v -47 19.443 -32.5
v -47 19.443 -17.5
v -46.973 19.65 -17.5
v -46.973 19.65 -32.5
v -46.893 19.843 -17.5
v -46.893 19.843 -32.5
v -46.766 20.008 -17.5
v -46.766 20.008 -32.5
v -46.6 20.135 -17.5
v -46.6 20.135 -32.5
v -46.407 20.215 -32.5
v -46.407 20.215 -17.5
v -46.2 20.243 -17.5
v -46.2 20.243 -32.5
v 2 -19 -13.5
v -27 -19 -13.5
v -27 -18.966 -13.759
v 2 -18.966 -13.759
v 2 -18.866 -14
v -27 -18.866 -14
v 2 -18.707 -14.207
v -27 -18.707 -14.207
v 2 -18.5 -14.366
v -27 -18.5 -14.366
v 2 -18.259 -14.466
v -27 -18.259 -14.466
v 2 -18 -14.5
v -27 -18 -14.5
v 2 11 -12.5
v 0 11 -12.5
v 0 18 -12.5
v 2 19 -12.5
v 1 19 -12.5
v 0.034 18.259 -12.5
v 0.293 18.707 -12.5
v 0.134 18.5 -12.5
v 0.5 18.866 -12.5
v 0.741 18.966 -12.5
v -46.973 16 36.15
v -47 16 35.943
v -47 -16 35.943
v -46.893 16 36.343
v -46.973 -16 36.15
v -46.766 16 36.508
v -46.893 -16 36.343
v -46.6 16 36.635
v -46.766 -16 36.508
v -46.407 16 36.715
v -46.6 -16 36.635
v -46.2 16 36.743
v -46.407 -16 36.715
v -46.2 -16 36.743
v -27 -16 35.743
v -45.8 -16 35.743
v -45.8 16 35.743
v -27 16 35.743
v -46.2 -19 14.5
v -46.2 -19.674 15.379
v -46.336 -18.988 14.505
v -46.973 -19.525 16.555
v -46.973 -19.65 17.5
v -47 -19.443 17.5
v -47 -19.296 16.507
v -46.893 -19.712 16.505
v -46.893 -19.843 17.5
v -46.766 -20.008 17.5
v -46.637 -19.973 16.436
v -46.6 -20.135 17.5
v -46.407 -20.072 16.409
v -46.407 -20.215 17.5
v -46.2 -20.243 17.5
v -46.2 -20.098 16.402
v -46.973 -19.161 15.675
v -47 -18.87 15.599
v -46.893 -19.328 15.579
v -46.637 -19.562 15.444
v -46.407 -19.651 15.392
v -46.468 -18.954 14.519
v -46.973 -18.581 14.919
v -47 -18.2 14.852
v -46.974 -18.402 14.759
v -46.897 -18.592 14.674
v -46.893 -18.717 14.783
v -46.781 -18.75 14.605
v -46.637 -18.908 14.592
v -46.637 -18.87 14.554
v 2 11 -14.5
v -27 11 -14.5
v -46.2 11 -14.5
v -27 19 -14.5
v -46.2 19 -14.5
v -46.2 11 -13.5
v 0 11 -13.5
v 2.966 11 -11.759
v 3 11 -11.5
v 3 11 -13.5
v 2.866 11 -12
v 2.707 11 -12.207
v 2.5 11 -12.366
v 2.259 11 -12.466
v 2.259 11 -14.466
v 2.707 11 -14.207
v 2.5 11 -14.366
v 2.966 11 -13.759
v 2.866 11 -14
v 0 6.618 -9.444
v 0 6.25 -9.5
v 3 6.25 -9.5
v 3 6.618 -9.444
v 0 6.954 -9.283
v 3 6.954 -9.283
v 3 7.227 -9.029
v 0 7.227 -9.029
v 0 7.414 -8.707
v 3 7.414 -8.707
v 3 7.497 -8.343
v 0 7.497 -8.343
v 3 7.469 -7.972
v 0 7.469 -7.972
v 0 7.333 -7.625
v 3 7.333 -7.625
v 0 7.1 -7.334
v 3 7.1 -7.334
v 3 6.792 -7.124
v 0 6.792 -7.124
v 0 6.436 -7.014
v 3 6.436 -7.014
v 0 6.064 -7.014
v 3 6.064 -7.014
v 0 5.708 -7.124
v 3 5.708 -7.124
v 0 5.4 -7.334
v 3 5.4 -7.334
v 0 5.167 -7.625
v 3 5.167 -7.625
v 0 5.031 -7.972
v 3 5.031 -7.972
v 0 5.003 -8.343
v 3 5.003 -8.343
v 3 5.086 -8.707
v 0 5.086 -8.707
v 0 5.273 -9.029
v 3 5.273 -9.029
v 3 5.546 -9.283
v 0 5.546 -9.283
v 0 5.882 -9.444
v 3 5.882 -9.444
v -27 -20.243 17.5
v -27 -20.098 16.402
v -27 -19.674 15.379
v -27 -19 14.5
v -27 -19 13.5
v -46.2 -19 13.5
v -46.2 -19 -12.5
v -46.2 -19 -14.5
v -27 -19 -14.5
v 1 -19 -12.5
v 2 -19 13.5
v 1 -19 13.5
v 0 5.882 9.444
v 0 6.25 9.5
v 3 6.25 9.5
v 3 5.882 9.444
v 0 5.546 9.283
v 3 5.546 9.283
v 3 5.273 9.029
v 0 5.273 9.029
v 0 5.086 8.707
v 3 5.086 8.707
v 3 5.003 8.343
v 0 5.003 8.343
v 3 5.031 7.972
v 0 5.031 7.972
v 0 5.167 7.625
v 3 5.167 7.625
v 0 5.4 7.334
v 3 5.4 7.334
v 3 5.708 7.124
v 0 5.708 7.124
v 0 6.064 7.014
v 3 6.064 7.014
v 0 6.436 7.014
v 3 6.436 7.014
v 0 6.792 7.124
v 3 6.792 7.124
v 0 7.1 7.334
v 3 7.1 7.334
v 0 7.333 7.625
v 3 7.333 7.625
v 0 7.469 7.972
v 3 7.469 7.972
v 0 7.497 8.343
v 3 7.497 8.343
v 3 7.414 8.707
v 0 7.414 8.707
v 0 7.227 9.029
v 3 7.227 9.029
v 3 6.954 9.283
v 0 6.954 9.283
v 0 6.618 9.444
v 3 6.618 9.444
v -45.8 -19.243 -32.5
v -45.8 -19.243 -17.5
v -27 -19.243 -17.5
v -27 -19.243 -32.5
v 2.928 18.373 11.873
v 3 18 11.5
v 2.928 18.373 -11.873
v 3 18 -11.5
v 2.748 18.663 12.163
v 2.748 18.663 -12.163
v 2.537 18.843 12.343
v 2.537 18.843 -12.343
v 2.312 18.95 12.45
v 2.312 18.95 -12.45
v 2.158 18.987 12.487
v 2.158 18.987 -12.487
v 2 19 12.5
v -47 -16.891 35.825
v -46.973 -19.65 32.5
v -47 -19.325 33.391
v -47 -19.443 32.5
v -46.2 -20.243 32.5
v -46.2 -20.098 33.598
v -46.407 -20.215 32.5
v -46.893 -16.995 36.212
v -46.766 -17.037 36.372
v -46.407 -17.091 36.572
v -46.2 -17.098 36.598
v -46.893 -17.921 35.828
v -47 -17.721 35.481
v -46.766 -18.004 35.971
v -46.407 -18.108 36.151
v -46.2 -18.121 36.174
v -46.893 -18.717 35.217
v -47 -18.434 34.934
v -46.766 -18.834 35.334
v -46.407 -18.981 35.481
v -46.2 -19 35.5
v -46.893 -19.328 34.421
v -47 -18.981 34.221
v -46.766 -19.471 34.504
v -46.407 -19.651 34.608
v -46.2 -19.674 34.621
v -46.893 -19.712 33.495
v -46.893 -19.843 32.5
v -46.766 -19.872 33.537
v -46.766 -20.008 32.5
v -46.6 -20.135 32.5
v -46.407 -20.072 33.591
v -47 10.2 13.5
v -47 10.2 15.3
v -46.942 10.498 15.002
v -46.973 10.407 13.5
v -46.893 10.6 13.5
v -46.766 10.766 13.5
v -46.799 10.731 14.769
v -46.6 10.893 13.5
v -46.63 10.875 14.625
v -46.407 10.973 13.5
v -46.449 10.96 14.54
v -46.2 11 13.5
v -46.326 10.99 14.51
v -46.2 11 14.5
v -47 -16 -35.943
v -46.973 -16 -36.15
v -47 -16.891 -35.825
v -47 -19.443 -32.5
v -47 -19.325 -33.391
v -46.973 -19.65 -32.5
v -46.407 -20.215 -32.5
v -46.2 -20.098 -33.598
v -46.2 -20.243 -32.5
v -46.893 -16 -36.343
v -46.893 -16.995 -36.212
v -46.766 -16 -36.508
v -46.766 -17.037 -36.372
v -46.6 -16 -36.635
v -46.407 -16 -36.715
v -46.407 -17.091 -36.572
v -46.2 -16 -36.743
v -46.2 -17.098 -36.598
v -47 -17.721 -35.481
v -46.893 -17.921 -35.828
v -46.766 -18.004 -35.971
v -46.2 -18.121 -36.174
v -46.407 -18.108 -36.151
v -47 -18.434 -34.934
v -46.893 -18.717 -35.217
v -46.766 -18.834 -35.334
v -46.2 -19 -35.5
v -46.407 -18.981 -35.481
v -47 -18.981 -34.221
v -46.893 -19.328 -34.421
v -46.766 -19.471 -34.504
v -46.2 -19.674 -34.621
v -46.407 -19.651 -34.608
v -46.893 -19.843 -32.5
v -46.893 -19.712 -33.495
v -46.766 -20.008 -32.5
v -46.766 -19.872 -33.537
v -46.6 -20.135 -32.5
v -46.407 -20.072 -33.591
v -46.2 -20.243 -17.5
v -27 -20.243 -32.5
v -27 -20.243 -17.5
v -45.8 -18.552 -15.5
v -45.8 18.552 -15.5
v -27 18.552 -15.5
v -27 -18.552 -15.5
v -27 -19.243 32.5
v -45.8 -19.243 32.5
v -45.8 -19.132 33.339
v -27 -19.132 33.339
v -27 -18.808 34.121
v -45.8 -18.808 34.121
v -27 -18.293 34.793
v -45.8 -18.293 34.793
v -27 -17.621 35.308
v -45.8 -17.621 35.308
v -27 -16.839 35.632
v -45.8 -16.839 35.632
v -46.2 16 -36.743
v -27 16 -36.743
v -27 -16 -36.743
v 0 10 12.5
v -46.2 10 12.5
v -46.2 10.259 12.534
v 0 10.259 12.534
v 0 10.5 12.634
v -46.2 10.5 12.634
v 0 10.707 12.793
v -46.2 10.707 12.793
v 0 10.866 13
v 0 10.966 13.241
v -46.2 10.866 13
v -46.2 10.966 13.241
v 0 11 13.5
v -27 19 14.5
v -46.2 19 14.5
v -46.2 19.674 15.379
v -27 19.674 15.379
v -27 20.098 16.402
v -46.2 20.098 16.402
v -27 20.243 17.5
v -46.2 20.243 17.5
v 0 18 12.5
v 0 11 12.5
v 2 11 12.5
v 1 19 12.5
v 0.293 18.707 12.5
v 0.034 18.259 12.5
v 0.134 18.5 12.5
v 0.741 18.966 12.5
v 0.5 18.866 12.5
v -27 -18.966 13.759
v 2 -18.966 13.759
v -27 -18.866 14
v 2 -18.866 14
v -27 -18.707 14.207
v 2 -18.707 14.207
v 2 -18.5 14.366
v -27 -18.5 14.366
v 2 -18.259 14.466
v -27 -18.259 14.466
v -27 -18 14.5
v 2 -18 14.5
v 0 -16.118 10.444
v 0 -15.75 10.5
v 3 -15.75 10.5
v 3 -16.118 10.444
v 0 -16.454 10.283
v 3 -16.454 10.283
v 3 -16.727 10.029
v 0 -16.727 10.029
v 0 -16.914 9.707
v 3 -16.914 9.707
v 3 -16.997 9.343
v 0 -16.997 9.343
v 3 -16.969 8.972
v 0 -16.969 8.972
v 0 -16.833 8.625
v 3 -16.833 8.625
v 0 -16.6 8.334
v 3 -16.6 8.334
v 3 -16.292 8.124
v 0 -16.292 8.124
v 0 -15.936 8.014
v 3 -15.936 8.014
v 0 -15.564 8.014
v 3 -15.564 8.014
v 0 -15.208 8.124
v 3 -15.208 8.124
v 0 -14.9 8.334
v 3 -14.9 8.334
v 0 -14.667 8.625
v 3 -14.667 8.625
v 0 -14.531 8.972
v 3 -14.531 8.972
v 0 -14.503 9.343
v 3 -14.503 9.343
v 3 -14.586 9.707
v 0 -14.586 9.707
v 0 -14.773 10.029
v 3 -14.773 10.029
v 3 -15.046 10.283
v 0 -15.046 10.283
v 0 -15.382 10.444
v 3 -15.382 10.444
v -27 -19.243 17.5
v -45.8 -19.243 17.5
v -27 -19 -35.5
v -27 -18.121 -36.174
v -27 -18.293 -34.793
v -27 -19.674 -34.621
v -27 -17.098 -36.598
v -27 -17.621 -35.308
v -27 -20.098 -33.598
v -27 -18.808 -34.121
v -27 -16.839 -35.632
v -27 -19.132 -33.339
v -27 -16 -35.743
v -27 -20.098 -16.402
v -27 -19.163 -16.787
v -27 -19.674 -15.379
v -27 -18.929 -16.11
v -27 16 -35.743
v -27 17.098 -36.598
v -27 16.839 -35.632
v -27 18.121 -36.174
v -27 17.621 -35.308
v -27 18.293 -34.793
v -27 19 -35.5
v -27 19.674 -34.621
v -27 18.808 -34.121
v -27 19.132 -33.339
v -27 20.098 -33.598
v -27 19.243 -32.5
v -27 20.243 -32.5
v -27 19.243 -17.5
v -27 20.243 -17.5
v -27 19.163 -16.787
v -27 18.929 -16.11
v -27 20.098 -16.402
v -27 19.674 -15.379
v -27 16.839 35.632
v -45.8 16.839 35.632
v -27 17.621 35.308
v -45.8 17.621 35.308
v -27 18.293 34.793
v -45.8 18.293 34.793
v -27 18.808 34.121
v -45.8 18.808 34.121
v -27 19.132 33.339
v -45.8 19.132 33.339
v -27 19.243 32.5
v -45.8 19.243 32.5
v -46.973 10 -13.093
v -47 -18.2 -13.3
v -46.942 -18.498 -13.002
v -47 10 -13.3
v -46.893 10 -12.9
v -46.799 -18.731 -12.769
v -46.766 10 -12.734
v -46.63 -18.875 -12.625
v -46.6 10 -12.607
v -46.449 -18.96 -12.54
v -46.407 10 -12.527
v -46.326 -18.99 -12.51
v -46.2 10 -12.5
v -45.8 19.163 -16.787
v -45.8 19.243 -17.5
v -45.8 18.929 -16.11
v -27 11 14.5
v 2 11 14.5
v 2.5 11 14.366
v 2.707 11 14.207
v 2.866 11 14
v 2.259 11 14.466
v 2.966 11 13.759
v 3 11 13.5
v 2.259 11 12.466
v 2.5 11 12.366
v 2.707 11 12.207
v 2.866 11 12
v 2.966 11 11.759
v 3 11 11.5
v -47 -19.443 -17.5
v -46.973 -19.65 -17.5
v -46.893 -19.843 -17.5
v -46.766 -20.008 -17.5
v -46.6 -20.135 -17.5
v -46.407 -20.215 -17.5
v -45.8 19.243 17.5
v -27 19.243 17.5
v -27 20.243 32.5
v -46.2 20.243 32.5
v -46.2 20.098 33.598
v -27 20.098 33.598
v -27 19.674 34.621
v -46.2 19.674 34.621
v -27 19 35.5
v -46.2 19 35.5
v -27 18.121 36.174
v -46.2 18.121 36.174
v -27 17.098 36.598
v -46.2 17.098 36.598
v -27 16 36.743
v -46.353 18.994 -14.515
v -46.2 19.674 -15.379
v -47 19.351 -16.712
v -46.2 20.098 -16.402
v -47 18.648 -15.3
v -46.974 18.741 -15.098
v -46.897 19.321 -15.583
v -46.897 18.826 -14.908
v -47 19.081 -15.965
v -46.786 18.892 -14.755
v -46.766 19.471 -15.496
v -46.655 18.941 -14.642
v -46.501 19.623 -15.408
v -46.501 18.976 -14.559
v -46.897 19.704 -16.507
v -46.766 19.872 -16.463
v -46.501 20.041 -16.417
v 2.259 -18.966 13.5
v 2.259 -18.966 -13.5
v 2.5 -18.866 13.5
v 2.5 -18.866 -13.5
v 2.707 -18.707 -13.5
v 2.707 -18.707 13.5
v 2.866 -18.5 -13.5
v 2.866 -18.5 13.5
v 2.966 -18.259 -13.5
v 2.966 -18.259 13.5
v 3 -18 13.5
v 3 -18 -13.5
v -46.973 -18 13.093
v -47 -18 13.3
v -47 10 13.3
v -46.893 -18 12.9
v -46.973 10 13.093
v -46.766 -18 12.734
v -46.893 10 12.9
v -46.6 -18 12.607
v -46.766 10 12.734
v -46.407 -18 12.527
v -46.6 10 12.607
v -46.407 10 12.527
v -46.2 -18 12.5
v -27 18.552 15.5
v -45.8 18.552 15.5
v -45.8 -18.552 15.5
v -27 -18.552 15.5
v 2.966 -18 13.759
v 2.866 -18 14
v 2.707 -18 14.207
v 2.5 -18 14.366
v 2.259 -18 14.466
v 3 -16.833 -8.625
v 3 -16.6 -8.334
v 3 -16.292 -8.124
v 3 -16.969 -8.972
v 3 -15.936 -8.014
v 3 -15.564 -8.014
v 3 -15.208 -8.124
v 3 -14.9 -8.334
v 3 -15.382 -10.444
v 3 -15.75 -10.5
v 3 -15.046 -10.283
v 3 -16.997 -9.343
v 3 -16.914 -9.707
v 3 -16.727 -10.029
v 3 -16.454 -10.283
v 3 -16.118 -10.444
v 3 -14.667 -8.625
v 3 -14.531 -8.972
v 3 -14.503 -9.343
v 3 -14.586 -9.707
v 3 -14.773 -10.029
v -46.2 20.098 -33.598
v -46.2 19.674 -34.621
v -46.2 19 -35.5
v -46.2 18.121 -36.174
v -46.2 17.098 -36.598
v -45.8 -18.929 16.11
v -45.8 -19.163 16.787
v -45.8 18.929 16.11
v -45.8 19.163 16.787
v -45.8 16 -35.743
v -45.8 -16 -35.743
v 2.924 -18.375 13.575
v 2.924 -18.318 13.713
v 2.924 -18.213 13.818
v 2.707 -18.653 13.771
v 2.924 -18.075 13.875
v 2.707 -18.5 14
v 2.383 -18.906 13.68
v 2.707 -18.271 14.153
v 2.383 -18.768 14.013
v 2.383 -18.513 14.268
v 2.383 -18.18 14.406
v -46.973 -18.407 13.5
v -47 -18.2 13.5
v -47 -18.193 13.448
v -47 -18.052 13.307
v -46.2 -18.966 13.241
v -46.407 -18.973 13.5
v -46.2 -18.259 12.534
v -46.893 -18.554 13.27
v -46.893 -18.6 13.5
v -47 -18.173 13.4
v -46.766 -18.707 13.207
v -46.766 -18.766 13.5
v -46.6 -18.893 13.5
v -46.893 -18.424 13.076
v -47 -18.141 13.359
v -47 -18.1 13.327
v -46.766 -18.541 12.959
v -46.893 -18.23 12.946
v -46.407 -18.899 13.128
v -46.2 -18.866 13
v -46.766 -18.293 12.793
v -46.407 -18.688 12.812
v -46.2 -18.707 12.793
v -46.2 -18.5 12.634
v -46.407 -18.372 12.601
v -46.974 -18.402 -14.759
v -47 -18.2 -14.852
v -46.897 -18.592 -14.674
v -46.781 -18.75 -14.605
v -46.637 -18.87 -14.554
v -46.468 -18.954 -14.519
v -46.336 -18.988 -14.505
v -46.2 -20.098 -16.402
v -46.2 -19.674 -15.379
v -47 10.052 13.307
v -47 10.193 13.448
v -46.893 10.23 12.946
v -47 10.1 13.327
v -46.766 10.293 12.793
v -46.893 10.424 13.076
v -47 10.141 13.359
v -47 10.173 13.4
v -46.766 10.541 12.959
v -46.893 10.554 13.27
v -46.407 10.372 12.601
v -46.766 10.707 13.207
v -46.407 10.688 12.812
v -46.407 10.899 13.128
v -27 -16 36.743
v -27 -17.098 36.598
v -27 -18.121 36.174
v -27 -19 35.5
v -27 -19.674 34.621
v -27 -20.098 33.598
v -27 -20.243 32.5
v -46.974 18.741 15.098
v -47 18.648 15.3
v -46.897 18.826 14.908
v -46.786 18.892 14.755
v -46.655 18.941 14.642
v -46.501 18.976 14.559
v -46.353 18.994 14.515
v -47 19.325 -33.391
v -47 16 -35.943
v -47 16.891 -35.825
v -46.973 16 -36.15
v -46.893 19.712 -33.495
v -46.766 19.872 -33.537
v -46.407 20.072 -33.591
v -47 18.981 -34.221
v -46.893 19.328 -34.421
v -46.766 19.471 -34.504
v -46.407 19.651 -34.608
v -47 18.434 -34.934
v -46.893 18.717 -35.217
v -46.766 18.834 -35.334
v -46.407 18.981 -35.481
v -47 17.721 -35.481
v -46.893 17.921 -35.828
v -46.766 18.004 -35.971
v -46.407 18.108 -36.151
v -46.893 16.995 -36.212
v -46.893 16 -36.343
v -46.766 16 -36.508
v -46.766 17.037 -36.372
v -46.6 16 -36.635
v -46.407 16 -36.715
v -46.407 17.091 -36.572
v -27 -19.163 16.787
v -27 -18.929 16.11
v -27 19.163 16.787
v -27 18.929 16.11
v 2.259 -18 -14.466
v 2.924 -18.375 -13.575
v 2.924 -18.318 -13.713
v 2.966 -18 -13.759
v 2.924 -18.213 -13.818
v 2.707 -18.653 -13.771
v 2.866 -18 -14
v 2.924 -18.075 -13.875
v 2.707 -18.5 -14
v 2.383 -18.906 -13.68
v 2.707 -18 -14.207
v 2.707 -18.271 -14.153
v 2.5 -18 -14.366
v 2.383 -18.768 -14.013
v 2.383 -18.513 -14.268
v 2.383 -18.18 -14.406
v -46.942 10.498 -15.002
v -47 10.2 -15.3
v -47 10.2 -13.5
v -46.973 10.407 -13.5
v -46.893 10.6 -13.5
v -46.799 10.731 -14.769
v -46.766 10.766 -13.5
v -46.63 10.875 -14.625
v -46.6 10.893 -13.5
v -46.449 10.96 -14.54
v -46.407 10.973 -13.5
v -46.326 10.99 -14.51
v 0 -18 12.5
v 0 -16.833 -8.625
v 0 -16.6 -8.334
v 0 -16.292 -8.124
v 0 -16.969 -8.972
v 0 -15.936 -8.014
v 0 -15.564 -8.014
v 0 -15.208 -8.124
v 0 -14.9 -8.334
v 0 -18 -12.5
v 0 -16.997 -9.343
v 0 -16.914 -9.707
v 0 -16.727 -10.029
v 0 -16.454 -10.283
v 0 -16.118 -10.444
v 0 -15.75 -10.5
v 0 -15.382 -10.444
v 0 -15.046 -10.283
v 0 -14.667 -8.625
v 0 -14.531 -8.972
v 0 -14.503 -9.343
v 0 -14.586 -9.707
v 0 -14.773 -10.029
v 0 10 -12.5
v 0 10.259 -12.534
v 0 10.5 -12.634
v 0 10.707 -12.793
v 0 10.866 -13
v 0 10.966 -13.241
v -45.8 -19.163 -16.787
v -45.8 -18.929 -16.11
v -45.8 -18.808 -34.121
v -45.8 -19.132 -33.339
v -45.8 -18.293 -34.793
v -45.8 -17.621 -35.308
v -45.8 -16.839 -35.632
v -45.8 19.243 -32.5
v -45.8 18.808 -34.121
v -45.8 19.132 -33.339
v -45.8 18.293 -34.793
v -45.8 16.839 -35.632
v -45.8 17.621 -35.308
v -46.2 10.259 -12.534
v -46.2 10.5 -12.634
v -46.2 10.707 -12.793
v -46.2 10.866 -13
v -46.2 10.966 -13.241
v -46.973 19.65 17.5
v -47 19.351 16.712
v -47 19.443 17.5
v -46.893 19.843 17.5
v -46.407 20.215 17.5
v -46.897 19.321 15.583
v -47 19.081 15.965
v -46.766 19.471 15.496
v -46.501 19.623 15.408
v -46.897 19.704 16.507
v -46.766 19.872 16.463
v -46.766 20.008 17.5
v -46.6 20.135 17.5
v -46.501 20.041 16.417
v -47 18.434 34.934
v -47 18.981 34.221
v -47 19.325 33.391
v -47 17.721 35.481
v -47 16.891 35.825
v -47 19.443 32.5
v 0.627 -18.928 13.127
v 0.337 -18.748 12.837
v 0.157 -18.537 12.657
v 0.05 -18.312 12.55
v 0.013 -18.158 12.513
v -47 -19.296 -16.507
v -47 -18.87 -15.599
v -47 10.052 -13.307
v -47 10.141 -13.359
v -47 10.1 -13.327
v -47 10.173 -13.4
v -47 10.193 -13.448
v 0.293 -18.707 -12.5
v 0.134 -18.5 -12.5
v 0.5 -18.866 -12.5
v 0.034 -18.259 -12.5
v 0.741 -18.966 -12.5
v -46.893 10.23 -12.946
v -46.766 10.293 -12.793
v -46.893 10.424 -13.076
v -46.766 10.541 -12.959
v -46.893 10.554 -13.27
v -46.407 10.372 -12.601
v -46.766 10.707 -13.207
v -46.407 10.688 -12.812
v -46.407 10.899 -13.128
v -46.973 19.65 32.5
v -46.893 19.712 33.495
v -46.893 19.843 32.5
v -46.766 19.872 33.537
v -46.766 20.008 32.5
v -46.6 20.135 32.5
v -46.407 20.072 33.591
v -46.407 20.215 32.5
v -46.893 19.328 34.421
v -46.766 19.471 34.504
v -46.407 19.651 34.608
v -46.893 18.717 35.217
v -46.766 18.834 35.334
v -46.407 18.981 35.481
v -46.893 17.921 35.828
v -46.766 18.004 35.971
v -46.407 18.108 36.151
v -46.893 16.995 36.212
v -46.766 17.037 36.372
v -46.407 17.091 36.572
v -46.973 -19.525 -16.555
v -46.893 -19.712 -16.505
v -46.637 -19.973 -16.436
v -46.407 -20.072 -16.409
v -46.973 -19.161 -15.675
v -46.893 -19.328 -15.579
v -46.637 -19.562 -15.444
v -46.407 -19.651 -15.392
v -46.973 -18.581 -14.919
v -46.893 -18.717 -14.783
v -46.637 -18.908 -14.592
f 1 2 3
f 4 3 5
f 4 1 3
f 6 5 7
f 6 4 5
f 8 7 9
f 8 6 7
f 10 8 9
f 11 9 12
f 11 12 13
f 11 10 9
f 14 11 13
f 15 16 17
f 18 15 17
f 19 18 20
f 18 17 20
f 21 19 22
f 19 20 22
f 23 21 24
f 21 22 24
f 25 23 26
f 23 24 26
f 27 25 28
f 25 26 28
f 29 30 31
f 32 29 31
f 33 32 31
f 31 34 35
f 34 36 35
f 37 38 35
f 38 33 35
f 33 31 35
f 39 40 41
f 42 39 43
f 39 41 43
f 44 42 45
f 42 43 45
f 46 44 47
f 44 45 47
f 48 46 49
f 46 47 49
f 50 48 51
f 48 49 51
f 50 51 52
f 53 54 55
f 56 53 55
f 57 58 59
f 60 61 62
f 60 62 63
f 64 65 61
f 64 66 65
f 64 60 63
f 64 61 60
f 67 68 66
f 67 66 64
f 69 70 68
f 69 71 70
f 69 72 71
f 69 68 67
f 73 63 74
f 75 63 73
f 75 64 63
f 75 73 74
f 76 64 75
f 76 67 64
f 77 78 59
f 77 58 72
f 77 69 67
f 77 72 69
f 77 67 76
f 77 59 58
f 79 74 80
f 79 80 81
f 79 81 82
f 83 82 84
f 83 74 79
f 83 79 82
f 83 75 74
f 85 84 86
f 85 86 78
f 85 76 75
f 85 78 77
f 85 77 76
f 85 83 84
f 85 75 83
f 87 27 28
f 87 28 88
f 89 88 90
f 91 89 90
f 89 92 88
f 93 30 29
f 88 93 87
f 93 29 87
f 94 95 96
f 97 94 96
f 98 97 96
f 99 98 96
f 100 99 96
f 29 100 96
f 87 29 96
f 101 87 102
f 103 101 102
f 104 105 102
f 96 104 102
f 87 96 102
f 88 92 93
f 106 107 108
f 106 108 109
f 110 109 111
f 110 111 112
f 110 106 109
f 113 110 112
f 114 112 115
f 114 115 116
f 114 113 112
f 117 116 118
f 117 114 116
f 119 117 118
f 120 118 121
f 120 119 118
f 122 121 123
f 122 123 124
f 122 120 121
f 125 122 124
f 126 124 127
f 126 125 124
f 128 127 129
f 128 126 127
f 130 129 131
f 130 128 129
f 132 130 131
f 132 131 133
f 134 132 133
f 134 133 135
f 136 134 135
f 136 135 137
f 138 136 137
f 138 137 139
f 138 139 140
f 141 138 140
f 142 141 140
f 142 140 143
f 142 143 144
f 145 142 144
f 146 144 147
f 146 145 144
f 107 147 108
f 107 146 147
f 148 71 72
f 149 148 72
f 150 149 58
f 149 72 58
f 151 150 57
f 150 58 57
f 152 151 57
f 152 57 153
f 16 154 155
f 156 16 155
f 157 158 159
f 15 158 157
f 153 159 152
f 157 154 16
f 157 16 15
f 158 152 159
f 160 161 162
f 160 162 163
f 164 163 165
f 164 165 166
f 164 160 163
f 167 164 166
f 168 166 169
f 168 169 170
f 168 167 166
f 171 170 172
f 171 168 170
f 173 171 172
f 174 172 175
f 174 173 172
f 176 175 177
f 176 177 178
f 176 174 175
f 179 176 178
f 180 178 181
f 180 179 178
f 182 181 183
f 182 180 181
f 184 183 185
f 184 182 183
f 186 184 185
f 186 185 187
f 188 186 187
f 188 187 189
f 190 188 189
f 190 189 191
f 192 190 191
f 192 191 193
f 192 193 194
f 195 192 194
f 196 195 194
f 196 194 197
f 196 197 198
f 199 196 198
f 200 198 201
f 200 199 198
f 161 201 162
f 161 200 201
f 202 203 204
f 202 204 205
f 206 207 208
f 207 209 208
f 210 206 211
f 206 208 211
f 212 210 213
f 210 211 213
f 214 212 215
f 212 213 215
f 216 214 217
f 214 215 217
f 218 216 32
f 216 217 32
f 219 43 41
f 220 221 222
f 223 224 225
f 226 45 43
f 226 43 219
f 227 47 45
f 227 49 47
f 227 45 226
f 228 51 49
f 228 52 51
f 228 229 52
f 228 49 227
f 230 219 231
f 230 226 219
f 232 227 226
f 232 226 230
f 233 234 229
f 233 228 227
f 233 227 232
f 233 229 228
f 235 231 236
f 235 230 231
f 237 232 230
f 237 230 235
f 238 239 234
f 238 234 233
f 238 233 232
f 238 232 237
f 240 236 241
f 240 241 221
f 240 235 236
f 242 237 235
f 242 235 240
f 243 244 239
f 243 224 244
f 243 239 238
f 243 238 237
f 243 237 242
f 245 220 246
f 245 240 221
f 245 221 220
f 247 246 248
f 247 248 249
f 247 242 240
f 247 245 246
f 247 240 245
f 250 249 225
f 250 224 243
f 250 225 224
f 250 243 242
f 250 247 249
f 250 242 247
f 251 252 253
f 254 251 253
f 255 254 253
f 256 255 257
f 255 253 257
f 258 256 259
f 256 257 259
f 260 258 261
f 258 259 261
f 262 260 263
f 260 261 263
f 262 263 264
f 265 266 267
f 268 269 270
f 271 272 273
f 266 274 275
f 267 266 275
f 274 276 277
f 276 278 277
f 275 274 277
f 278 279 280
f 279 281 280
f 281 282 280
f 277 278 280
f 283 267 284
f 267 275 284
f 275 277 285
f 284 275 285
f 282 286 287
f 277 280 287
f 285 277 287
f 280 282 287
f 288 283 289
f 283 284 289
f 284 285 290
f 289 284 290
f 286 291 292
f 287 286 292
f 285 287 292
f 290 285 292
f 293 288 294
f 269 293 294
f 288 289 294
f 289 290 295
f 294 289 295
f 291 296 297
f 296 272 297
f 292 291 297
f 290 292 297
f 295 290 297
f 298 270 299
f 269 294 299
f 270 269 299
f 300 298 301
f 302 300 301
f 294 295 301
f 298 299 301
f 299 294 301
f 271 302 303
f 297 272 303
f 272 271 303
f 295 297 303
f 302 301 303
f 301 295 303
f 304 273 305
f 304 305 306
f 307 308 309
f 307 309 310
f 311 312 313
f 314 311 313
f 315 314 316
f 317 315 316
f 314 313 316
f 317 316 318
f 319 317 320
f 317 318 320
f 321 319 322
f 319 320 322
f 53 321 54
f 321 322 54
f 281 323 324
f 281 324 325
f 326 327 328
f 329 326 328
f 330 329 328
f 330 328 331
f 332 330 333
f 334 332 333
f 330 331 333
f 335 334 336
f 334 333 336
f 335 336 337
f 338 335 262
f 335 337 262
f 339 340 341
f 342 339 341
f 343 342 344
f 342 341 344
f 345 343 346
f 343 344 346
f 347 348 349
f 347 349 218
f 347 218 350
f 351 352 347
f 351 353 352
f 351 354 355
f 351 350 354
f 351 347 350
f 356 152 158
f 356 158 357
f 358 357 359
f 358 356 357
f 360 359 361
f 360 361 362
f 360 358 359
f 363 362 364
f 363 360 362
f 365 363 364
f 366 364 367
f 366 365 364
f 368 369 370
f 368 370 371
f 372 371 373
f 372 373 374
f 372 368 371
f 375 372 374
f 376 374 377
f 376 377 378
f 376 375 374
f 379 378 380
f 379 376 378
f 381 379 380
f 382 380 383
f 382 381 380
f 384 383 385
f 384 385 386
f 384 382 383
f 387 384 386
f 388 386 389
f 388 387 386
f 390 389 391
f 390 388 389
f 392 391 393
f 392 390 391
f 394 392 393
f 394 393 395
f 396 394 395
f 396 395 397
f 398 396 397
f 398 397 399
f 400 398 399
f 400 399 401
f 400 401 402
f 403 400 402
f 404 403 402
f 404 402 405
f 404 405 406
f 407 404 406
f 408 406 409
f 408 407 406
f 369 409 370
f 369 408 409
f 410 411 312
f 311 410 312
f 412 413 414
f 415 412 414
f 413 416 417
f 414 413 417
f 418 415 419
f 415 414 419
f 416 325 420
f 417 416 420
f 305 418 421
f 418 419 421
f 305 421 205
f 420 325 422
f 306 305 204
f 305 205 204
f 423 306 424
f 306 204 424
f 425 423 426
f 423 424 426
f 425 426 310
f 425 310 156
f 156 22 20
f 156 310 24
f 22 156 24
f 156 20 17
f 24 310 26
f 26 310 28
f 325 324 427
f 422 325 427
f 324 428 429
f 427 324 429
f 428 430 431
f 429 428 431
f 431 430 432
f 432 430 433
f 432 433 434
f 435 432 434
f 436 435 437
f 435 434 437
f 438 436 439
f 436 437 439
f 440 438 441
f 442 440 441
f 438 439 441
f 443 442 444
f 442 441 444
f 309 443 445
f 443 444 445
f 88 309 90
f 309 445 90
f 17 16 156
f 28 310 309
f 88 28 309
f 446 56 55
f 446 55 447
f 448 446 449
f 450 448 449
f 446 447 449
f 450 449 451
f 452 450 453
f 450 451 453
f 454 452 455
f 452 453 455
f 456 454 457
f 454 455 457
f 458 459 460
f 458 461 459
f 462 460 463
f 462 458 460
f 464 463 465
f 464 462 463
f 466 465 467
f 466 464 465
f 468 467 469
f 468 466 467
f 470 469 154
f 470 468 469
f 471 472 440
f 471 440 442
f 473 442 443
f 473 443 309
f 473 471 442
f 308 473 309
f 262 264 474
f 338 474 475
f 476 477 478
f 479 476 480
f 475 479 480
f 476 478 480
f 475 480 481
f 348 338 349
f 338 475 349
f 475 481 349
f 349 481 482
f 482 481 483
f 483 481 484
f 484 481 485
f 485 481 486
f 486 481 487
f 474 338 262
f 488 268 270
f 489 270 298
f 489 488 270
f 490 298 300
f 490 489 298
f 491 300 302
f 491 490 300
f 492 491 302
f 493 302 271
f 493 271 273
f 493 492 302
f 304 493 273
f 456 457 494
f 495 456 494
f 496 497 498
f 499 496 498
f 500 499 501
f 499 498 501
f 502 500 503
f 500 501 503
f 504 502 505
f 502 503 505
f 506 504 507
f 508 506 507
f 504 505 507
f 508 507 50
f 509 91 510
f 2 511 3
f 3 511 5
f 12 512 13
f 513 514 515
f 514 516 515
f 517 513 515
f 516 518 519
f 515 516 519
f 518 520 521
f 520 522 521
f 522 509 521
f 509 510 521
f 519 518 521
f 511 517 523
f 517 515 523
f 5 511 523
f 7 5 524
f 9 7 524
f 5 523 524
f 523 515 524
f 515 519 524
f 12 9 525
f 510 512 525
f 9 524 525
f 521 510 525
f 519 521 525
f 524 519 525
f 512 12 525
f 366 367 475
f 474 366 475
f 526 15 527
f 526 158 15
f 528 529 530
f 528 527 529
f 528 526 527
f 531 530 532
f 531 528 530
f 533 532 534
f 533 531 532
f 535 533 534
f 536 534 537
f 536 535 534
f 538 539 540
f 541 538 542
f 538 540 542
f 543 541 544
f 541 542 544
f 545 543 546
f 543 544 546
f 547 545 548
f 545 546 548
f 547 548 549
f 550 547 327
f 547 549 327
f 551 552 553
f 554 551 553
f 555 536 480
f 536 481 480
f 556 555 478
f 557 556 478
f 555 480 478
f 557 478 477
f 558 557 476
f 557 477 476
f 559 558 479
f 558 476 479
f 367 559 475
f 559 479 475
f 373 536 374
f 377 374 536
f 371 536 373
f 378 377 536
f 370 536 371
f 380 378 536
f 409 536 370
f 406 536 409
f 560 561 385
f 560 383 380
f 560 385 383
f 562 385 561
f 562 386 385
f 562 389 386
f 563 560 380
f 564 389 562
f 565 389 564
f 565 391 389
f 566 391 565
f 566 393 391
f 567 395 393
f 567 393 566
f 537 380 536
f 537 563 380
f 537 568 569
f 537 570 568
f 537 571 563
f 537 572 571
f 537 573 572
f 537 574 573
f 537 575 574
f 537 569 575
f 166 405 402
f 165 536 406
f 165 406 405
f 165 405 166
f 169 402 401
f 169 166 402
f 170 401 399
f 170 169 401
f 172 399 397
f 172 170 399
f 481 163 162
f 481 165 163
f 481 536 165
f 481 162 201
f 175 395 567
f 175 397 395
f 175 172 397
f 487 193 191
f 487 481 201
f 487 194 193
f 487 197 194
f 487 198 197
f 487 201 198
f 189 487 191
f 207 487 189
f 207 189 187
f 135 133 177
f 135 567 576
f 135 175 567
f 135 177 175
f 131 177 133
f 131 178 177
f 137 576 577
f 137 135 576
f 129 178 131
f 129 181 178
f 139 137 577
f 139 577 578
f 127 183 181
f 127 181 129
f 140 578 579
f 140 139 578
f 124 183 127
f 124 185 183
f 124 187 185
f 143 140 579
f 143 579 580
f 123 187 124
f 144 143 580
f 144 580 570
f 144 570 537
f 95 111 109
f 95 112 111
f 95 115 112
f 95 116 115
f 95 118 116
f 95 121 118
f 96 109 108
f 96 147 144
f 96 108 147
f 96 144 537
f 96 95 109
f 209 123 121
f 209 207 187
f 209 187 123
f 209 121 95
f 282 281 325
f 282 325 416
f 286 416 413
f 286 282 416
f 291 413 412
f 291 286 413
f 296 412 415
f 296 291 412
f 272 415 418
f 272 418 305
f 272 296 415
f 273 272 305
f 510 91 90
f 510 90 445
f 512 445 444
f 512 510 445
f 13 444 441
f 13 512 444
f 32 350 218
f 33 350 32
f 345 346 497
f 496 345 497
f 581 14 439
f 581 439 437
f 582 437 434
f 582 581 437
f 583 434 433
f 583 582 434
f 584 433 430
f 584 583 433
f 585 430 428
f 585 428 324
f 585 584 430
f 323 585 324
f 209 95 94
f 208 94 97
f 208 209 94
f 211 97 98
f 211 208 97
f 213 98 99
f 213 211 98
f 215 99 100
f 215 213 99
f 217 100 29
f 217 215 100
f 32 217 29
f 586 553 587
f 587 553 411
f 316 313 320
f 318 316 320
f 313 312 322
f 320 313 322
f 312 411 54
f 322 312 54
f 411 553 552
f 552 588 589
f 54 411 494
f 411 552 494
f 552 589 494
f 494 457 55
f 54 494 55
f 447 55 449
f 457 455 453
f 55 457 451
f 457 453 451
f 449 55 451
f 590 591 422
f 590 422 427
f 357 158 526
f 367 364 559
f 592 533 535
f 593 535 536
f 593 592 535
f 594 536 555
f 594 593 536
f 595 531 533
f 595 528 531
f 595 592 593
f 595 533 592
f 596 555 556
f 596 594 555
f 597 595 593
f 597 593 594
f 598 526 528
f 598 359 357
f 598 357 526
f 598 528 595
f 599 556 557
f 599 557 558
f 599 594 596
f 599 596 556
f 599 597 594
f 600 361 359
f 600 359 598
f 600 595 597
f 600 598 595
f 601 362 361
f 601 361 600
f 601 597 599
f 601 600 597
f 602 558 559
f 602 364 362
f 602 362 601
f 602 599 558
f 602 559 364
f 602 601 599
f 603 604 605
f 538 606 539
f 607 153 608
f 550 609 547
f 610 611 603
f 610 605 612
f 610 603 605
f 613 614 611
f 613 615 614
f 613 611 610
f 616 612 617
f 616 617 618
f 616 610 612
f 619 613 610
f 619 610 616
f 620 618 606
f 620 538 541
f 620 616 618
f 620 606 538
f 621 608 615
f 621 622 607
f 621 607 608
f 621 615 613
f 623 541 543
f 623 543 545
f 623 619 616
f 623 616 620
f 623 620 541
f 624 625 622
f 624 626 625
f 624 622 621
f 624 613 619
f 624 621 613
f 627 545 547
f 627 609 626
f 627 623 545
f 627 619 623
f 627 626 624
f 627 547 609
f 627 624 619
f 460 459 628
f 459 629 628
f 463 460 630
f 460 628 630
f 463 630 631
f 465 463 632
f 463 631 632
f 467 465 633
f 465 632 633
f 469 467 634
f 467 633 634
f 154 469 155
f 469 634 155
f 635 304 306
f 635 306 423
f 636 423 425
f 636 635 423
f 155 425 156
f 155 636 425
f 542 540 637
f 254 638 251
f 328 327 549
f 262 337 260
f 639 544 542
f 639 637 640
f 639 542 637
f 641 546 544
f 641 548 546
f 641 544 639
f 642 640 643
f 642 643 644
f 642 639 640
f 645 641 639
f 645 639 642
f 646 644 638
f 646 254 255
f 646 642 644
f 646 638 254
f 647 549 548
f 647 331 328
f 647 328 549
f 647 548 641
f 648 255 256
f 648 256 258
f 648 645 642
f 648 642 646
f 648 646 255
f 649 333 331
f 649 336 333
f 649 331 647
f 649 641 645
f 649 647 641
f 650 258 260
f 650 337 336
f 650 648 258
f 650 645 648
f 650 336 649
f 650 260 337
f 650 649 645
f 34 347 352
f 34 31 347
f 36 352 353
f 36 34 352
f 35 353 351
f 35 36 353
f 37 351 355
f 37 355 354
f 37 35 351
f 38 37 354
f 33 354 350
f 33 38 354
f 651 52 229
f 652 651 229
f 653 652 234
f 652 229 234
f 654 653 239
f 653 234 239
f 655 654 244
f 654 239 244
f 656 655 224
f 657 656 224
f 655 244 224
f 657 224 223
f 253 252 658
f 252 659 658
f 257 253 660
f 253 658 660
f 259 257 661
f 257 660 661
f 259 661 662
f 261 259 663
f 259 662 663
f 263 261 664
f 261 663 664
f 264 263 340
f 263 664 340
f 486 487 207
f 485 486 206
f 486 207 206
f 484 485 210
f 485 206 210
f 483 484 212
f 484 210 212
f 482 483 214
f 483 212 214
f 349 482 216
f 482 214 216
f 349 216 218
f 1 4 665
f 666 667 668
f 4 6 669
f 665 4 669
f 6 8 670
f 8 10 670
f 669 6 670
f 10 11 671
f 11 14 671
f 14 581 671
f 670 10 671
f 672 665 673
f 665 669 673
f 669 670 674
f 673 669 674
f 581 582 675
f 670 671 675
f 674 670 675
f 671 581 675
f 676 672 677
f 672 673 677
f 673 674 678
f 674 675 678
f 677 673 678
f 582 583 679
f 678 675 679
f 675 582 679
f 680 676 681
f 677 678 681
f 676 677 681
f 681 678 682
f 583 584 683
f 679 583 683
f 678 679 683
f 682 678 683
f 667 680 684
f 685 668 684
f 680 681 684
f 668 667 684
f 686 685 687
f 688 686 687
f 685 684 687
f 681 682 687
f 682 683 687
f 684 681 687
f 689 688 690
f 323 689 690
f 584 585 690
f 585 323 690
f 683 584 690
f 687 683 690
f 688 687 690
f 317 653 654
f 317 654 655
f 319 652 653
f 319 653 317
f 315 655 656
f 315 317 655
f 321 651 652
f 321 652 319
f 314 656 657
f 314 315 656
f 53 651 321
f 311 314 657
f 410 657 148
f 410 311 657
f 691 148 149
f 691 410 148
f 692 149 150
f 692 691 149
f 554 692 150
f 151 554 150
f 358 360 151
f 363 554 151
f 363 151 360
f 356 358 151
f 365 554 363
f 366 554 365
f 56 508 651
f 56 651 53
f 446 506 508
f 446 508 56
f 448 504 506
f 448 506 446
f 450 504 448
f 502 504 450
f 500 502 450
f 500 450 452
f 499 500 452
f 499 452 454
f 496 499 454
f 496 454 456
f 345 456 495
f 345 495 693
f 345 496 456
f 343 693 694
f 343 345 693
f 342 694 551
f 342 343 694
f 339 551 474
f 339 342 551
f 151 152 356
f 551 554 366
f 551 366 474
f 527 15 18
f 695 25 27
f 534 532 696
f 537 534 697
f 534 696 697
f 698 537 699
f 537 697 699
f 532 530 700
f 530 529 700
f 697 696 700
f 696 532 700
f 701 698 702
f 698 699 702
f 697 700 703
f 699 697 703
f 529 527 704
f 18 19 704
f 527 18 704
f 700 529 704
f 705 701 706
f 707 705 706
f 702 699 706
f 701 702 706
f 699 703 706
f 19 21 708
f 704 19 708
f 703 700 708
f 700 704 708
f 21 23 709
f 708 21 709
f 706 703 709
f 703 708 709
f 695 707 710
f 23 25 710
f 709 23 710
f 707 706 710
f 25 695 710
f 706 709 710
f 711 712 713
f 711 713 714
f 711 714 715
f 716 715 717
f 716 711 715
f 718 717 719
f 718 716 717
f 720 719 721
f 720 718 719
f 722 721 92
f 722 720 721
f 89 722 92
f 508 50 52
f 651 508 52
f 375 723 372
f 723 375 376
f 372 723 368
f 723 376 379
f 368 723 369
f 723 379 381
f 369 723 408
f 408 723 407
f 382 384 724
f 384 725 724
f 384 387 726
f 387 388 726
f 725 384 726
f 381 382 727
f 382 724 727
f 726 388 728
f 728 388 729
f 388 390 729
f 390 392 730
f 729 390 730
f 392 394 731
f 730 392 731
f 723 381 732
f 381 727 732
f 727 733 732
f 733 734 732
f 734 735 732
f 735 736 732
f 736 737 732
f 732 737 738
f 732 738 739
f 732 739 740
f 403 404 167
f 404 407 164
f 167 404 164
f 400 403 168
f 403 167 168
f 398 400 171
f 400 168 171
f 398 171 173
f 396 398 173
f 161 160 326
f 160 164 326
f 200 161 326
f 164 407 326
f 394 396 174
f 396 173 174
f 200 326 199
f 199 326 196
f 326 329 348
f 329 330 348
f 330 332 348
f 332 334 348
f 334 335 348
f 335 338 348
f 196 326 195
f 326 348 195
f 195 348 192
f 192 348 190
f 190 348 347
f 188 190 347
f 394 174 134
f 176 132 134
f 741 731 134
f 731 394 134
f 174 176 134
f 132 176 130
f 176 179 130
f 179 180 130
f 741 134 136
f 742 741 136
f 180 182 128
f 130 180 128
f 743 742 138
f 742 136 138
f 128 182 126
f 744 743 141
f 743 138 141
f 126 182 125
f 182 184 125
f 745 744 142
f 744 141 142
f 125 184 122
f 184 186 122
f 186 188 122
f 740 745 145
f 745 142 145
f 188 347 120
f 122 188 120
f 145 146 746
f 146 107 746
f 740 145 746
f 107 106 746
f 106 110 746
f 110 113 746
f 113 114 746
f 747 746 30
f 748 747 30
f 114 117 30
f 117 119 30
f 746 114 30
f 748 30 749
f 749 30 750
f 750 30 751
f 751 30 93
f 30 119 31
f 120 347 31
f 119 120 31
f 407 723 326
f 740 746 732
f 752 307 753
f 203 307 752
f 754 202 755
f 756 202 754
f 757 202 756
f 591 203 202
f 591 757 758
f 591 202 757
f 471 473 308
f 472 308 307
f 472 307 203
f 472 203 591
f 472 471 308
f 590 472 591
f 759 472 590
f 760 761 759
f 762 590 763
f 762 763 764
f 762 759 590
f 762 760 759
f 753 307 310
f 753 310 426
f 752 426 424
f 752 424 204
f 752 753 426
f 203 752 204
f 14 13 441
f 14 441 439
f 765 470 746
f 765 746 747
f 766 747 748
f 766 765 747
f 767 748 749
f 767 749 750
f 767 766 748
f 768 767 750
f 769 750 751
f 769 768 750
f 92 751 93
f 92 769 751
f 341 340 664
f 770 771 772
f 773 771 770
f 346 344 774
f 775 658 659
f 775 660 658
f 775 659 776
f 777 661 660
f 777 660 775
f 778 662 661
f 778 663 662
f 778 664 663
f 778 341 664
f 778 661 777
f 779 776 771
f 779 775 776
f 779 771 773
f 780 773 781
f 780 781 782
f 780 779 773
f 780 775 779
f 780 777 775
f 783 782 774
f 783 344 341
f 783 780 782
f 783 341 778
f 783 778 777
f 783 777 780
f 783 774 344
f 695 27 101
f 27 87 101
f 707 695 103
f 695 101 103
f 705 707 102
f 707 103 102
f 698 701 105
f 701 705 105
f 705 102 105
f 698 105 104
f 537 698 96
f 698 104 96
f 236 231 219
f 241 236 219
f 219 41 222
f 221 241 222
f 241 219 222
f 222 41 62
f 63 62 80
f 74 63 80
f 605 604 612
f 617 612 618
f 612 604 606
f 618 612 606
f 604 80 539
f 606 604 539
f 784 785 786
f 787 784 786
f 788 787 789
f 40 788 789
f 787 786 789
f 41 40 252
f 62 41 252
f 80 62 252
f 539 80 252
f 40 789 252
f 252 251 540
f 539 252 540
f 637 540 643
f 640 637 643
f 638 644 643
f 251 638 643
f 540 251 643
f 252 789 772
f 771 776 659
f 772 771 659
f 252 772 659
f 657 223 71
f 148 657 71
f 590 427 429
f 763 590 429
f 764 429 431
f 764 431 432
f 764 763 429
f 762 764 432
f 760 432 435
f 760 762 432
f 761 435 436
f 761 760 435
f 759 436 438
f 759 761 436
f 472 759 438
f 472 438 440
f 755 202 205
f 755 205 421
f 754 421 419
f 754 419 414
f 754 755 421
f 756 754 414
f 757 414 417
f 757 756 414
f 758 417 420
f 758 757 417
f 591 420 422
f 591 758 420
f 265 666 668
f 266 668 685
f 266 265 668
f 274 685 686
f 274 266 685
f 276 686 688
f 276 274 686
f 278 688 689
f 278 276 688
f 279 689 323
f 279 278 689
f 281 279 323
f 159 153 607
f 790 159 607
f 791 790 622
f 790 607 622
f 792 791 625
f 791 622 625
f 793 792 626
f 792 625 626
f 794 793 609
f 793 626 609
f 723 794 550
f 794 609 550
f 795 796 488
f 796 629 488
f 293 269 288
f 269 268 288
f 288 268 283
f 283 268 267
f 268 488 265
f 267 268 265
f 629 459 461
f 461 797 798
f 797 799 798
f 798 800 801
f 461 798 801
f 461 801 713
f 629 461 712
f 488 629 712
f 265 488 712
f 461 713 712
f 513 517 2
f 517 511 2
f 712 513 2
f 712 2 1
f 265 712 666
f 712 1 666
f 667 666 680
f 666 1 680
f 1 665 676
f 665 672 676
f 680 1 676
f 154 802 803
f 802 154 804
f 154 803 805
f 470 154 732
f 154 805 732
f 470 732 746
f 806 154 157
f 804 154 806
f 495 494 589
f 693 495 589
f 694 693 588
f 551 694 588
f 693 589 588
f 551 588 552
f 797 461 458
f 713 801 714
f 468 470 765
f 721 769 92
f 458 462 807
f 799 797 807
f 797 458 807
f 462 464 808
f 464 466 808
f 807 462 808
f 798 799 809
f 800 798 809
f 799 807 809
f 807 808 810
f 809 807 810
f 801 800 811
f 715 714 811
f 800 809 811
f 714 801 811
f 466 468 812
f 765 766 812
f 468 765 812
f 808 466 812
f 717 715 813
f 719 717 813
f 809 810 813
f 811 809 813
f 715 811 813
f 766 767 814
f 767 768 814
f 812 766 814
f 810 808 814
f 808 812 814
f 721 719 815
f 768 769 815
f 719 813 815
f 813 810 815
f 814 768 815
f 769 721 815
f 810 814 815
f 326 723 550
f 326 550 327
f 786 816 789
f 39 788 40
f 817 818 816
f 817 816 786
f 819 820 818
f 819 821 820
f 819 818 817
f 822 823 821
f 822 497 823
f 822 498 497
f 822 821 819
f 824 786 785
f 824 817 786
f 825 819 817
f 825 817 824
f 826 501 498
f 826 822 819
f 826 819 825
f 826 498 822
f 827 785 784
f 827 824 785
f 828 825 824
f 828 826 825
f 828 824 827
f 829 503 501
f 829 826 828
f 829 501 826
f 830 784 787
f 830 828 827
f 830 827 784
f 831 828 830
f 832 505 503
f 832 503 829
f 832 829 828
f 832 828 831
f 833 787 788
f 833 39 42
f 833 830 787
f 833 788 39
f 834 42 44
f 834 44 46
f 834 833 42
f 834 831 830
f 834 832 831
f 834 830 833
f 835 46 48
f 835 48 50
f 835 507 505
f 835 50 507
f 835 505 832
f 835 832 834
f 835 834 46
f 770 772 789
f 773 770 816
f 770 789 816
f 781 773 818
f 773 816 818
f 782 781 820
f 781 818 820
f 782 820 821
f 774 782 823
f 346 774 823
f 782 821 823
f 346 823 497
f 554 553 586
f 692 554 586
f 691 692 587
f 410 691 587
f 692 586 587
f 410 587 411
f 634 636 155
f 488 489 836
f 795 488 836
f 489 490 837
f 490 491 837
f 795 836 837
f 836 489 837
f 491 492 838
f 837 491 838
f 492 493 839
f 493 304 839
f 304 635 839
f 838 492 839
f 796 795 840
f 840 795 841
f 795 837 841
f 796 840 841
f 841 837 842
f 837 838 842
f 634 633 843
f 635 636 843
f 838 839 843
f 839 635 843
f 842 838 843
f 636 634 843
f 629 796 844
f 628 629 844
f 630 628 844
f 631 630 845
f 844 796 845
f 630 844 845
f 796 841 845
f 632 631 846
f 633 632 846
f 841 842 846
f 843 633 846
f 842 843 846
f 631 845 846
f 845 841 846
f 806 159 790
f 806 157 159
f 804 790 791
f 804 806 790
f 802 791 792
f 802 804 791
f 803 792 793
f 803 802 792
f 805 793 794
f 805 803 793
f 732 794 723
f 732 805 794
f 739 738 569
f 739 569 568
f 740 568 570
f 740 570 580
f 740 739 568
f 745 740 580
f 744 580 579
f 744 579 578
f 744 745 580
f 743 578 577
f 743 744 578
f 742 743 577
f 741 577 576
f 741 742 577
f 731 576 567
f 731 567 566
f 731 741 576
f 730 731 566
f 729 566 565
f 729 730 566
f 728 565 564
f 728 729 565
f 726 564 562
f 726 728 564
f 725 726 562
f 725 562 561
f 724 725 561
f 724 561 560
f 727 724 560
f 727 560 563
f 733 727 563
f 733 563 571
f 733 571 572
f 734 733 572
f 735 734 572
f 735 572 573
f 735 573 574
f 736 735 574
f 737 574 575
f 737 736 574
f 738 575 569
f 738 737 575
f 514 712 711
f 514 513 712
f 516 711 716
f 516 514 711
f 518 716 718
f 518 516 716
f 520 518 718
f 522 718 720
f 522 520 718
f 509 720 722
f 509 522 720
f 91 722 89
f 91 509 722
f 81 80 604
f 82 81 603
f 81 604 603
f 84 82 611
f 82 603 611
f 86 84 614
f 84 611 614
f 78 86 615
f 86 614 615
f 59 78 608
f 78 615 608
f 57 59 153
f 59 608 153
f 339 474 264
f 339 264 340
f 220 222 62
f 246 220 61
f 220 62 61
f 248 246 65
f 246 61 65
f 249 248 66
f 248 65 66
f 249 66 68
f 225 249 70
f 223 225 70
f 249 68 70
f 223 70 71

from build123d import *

# Parameters (mm, degrees)
SKETCH_1_W      = 25
SKETCH_1_H      = 38
SKETCH_1_R      = 1.25
EXTRUDE_2_DEPTH = 3
SKETCH_2_W      = 2
SKETCH_2_H      = 30
EXTRUDE_3_DEPTH = 50
EXTRUDE_6_DEPTH = 20
EXTRUDE_7_DEPTH = 1.2
FILLET_4_R      = 1
FILLET_5_R      = 0.8


with BuildPart() as part:
    # 草图1 → 凸台-拉伸2 (new body)
    with BuildSketch(Plane(origin=(0, 0, 0), x_dir=(0, 0, -1), z_dir=(1, 0, 0))):
        Rectangle(SKETCH_1_W, SKETCH_1_H)
        with Locations((9.25, -15.75)):
            Circle(SKETCH_1_R, mode=Mode.SUBTRACT)
        with Locations((8.25, 6.25)):
            Circle(SKETCH_1_R, mode=Mode.SUBTRACT)
        with Locations(Location((-9.25, -15.75, 0), (0, 0, 180))):
            Circle(SKETCH_1_R, mode=Mode.SUBTRACT)
        with Locations(Location((-8.25, 6.25, 0), (0, 0, 180))):
            Circle(SKETCH_1_R, mode=Mode.SUBTRACT)
    extrude(amount=EXTRUDE_2_DEPTH)

    # 草图2 → 凸台-拉伸3 (add)
    with BuildSketch(Plane(origin=(3, 0, 0), x_dir=(0, 0, -1), z_dir=(1, 0, 0))):
        with Locations((13.5, -4)):
            Rectangle(SKETCH_2_W, SKETCH_2_H)
        with Locations((-13.5, -4)):
            Rectangle(SKETCH_2_W, SKETCH_2_H)
    extrude(amount=-EXTRUDE_3_DEPTH)

    # 草图4 → 凸台-拉伸6 (add)
    # profile 1 of 2: a face of its own
    with BuildSketch(Plane.ZY.offset(47)):
        with BuildLine():
            Line((-14.5, 11), (-14.5, 19))
            ThreePointArc((-14.5, 19), (-15.8764117, 19.919688895), (-17.5, 20.242640687))
            Line((-17.5, 20.242640687), (-32.5, 20.242640687))
            ThreePointArc((-32.5, 20.242640687), (-35.5, 19), (-36.742640687, 16))
            Line((-36.742640687, 16), (-36.742640687, -16))
            ThreePointArc((-36.742640687, -16), (-35.5, -19), (-32.5, -20.242640687))
            Line((-32.5, -20.242640687), (-17.5, -20.242640687))
            ThreePointArc((-17.5, -20.242640687), (-15.8764117, -19.919688895), (-14.5, -19))
            Line((-14.5, -19), (-14.5, 11))
        make_face()
        with BuildLine():
            Line((-32.5, 19.242640687), (-25, 19.242640687))
            Line((-25, 19.242640687), (-17.5, 19.242640687))
            ThreePointArc((-17.5, 19.242640687), (-16.442120098, 19.065225724), (-15.5, 18.552394685))
            Line((-15.5, 18.552394685), (-15.5, -12.035462258))
            Line((-15.5, -12.035462258), (-15.5, -18.552394685))
            ThreePointArc((-15.5, -18.552394685), (-16.442120098, -19.065225724), (-17.5, -19.242640687))
            Line((-17.5, -19.242640687), (-31.503062925, -19.242640687))
            Line((-31.503062925, -19.242640687), (-32.5, -19.242640687))
            ThreePointArc((-32.5, -19.242640687), (-34.792893219, -18.292893219), (-35.742640687, -16))
            Line((-35.742640687, -16), (-35.742640687, -12.035462258))
            Line((-35.742640687, -12.035462258), (-35.742640687, 16))
            ThreePointArc((-35.742640687, 16), (-34.792893219, 18.292893219), (-32.5, 19.242640687))
        make_face(mode=Mode.SUBTRACT)
    # profile 2 of 2: a face of its own
    with BuildSketch(Plane.ZY.offset(47)):
        with BuildLine():
            Line((14.5, -19), (14.5, 11))
            Line((14.5, 11), (14.5, 19))
            ThreePointArc((14.5, 19), (15.8764117, 19.919688895), (17.5, 20.242640687))
            Line((17.5, 20.242640687), (32.5, 20.242640687))
            ThreePointArc((32.5, 20.242640687), (35.5, 19), (36.742640687, 16))
            Line((36.742640687, 16), (36.742640687, -16))
            ThreePointArc((36.742640687, -16), (35.5, -19), (32.5, -20.242640687))
            Line((32.5, -20.242640687), (17.5, -20.242640687))
            ThreePointArc((17.5, -20.242640687), (15.8764117, -19.919688895), (14.5, -19))
        make_face()
        with BuildLine():
            Line((35.742640687, -12.035462258), (35.742640687, 16))
            ThreePointArc((35.742640687, 16), (34.792893219, 18.292893219), (32.5, 19.242640687))
            Line((32.5, 19.242640687), (25, 19.242640687))
            Line((25, 19.242640687), (17.5, 19.242640687))
            ThreePointArc((17.5, 19.242640687), (16.442120098, 19.065225724), (15.5, 18.552394685))
            Line((15.5, 18.552394685), (15.5, -12.035462258))
            Line((15.5, -12.035462258), (15.5, -18.552394685))
            ThreePointArc((15.5, -18.552394685), (16.442120098, -19.065225724), (17.5, -19.242640687))
            Line((17.5, -19.242640687), (31.503062925, -19.242640687))
            Line((31.503062925, -19.242640687), (32.5, -19.242640687))
            ThreePointArc((32.5, -19.242640687), (34.792893219, -18.292893219), (35.742640687, -16))
            Line((35.742640687, -16), (35.742640687, -12.035462258))
        make_face(mode=Mode.SUBTRACT)
    extrude(amount=-EXTRUDE_6_DEPTH)

    # 草图5 → 凸台-拉伸7 (add)
    with BuildSketch(Plane.ZY.offset(47)):
        with BuildLine():
            Line((-32.5, 19.242640687), (-17.5, 19.242640687))
            ThreePointArc((-17.5, 19.242640687), (-16.442120098, 19.065225724), (-15.5, 18.552394685))
            Line((-15.5, 18.552394685), (-15.5, -18.552394685))
            ThreePointArc((-15.5, -18.552394685), (-16.442120098, -19.065225724), (-17.5, -19.242640687))
            Line((-17.5, -19.242640687), (-32.5, -19.242640687))
            ThreePointArc((-32.5, -19.242640687), (-34.792893219, -18.292893219), (-35.742640687, -16))
            Line((-35.742640687, -16), (-35.742640687, 16))
            ThreePointArc((-35.742640687, 16), (-34.792893219, 18.292893219), (-32.5, 19.242640687))
        make_face()
        with BuildLine():
            Line((35.742640687, -16), (35.742640687, 16))
            ThreePointArc((35.742640687, 16), (34.792893219, 18.292893219), (32.5, 19.242640687))
            Line((32.5, 19.242640687), (17.5, 19.242640687))
            ThreePointArc((17.5, 19.242640687), (16.442120098, 19.065225724), (15.5, 18.552394685))
            Line((15.5, 18.552394685), (15.5, -18.552394685))
            ThreePointArc((15.5, -18.552394685), (16.442120098, -19.065225724), (17.5, -19.242640687))
            Line((17.5, -19.242640687), (32.5, -19.242640687))
            ThreePointArc((32.5, -19.242640687), (34.792893219, -18.292893219), (35.742640687, -16))
        make_face()
    extrude(amount=-EXTRUDE_7_DEPTH)

    # 圆角4
    fillet_4_edges = [part.edges().sort_by_distance(p)[0] for p in [
        (-23.5, -19, 12.5),
        (-12, -19, 14.5),
        (-12, -19, -14.5),
        (0, -19, 0),
        (0, 19, 0),
        (-23.5, 11, -12.5),
        (-23.5, 11, 12.5),
        (3, -19, 0),
        (3, 15, 12.5),
        (3, -4, 14.5),
        (3, -4, -14.5),
        (3, 15, -12.5),
        (3, 19, 0),
    ]]
    fillet(fillet_4_edges, radius=FILLET_4_R - 0.0001)  # a hair under: the kernel refuses the full size

    # 圆角5
    fillet_5_edges = [part.edges().sort_by_distance(p)[0] for p in [
        (-47, -19.919688895, 15.8764117),
        (-47, -20.242640687, 25),
        (-47, -19, 35.5),
        (-47, 0, 36.742640687),
        (-47, 19, 35.5),
        (-47, 20.242640687, 25),
        (-47, 19.919688895, 15.8764117),
        (-47, 15, 14.5),
        (-47, -4, 12.5),
        (-47, 11, 13.99995),
        (-47, 10.707136071, 12.792863929),
        (-47, -18.707136071, 12.792863929),
        (-47, -4.49995, -12.5),
        (-47, 10.707136071, -12.792863929),
        (-47, 11, -13.99995),
        (-47, -19, -13.5),
        (-47, -19, 13.99995),
        (-47, 19.919688895, -15.8764117),
        (-47, 20.242640687, -25),
        (-47, 19, -35.5),
        (-47, 0, -36.742640687),
        (-47, -19, -35.5),
        (-47, -20.242640687, -25),
        (-47, -19.919688895, -15.8764117),
        (-47, 15, -14.5),
    ]]
    fillet(fillet_5_edges, radius=FILLET_5_R)


solid = part.part
